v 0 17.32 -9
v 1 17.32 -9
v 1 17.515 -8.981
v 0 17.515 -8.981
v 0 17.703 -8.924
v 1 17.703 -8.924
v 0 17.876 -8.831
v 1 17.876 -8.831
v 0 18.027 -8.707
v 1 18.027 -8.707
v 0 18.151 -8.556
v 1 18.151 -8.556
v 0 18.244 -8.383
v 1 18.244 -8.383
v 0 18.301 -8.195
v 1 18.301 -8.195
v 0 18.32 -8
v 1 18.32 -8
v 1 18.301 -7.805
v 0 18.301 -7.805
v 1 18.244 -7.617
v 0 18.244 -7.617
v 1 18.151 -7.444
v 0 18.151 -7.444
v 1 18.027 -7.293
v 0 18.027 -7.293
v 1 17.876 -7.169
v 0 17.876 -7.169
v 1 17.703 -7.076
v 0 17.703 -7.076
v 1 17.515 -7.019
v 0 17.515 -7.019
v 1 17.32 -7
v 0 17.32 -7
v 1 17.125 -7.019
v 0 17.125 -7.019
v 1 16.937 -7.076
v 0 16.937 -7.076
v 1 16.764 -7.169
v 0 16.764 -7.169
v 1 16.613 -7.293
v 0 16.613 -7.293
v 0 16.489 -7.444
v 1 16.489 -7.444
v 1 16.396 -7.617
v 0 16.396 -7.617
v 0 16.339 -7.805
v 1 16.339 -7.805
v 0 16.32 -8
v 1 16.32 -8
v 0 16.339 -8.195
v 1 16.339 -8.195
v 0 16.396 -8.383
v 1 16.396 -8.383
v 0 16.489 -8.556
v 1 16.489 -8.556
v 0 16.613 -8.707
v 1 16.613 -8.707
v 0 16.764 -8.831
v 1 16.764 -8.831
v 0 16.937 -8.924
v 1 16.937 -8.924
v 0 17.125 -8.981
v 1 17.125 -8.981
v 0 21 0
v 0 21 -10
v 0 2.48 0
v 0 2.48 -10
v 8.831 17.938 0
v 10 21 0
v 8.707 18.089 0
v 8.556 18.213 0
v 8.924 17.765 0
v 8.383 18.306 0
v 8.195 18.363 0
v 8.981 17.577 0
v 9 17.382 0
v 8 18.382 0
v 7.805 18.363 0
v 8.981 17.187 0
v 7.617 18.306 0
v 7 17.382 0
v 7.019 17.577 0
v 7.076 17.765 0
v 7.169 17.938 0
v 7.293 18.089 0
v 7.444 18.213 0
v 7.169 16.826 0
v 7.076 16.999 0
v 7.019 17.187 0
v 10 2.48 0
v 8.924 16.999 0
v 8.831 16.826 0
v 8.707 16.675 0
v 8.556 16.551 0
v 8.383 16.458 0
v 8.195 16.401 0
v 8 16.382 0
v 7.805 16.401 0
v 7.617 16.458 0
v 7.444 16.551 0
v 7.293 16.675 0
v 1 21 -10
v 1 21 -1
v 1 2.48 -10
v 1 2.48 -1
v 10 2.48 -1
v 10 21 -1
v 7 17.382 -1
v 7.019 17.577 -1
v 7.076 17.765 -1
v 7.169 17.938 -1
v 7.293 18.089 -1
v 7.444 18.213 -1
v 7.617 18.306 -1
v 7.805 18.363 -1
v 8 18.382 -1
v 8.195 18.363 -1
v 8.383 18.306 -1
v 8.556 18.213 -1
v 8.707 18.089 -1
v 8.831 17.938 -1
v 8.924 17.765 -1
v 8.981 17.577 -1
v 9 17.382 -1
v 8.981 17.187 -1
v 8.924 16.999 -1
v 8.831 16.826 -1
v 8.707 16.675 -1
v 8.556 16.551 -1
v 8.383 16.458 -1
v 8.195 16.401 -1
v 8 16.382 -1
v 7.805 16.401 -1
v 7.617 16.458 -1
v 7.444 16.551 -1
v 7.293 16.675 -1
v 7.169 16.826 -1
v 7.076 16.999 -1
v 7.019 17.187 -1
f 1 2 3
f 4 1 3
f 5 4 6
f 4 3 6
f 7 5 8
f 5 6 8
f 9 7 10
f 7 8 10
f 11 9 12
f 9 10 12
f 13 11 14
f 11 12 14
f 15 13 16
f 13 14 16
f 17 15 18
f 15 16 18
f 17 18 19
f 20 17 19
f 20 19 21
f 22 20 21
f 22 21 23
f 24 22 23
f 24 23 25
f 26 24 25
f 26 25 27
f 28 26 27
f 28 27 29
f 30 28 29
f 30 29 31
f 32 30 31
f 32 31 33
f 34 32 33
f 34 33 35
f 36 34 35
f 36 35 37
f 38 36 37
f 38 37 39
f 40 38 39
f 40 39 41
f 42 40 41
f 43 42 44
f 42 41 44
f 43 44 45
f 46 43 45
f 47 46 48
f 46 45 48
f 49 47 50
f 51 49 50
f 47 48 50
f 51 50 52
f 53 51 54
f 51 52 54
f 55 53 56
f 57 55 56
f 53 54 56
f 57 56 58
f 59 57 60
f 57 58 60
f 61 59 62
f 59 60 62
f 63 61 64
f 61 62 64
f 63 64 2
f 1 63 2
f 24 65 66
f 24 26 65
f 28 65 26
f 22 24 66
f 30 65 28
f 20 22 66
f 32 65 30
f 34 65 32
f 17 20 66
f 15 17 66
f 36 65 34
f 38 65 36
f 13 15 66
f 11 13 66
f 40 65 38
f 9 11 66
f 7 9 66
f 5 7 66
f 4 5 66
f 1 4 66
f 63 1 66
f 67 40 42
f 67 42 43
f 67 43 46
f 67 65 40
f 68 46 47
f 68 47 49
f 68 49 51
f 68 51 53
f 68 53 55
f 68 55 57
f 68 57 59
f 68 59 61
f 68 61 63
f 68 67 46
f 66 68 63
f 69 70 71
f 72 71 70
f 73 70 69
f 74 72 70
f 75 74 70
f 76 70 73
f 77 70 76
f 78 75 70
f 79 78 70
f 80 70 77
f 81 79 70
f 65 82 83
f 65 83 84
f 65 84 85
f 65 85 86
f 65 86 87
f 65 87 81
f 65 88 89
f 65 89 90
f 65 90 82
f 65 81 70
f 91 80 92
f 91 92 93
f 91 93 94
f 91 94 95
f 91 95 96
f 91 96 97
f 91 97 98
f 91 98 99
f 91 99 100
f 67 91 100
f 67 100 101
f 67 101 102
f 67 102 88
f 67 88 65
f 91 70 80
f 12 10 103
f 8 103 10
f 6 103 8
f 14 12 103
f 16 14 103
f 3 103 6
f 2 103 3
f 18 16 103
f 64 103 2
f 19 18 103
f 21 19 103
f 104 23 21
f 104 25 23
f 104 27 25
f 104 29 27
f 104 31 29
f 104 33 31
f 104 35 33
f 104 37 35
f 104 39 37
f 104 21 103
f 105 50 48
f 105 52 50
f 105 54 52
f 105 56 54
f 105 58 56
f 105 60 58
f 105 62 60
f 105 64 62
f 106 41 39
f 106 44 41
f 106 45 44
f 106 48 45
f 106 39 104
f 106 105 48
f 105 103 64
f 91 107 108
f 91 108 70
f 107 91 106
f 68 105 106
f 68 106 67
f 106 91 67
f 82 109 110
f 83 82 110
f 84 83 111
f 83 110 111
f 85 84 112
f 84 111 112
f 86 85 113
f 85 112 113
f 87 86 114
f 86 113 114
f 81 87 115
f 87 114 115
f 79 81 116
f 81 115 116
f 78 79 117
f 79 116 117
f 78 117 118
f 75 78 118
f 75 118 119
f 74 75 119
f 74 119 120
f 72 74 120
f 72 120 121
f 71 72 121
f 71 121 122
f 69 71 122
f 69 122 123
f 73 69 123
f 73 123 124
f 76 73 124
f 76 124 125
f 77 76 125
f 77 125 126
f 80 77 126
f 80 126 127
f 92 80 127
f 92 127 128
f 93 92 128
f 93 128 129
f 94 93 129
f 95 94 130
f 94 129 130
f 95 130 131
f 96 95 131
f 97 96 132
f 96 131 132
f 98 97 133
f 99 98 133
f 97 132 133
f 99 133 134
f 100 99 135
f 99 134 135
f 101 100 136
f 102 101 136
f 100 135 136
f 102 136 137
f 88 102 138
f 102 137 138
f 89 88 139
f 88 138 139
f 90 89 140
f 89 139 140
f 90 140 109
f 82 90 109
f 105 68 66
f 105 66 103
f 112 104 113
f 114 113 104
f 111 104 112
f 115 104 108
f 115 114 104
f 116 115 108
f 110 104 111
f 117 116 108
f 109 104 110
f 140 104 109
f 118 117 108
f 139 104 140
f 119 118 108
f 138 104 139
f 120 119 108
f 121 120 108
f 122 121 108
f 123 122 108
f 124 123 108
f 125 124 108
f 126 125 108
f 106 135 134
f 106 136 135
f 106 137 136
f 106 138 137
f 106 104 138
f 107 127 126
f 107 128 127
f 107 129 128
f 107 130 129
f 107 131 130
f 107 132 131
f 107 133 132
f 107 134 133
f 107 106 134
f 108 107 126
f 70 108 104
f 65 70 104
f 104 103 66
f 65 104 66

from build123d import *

# Parameters (mm, degrees)
BOSS_EXTRUDE1_DEPTH = 21
SKETCH2_R           = 1
CUT_EXTRUDE1_DEPTH  = 21
CUT_EXTRUDE2_DEPTH  = 2.48
SKETCH4_R           = 1
CUT_EXTRUDE3_DEPTH  = 2.48


with BuildPart() as part:
    # Sketch1 → Boss-Extrude1 (new body)
    with BuildSketch(Plane(origin=(0, 0, 0), x_dir=(1, 0, 0), z_dir=(0, 1, 0))):
        Polygon((0, 0), (0, 10), (1, 10), (1, 1), (10, 1), (10, 0), align=None)
    extrude(amount=BOSS_EXTRUDE1_DEPTH)

    # Sketch2 → Cut-Extrude1 (cut)
    with BuildSketch(Plane(origin=(0, 0, -1), x_dir=(-1, 0, 0), z_dir=(0, 0, -1))):
        with Locations((-8, 17.381971211)):
            Circle(SKETCH2_R)
    extrude(amount=-CUT_EXTRUDE1_DEPTH, mode=Mode.SUBTRACT)

    # Sketch3 → Cut-Extrude2 (cut)
    with BuildSketch(Plane.XZ):
        Polygon((10, 0), (10, -1), (1, -1), (1, -10), (0, -10), (0, 0), align=None)
    extrude(amount=-CUT_EXTRUDE2_DEPTH, mode=Mode.SUBTRACT)

    # Sketch4 → Cut-Extrude3 (cut)
    with BuildSketch(Plane(origin=(1, 0, 0), x_dir=(0, 0, -1), z_dir=(1, 0, 0))):
        with Locations((8, 17.32)):
            Circle(SKETCH4_R)
    extrude(amount=-CUT_EXTRUDE3_DEPTH, mode=Mode.SUBTRACT)


solid = part.part
